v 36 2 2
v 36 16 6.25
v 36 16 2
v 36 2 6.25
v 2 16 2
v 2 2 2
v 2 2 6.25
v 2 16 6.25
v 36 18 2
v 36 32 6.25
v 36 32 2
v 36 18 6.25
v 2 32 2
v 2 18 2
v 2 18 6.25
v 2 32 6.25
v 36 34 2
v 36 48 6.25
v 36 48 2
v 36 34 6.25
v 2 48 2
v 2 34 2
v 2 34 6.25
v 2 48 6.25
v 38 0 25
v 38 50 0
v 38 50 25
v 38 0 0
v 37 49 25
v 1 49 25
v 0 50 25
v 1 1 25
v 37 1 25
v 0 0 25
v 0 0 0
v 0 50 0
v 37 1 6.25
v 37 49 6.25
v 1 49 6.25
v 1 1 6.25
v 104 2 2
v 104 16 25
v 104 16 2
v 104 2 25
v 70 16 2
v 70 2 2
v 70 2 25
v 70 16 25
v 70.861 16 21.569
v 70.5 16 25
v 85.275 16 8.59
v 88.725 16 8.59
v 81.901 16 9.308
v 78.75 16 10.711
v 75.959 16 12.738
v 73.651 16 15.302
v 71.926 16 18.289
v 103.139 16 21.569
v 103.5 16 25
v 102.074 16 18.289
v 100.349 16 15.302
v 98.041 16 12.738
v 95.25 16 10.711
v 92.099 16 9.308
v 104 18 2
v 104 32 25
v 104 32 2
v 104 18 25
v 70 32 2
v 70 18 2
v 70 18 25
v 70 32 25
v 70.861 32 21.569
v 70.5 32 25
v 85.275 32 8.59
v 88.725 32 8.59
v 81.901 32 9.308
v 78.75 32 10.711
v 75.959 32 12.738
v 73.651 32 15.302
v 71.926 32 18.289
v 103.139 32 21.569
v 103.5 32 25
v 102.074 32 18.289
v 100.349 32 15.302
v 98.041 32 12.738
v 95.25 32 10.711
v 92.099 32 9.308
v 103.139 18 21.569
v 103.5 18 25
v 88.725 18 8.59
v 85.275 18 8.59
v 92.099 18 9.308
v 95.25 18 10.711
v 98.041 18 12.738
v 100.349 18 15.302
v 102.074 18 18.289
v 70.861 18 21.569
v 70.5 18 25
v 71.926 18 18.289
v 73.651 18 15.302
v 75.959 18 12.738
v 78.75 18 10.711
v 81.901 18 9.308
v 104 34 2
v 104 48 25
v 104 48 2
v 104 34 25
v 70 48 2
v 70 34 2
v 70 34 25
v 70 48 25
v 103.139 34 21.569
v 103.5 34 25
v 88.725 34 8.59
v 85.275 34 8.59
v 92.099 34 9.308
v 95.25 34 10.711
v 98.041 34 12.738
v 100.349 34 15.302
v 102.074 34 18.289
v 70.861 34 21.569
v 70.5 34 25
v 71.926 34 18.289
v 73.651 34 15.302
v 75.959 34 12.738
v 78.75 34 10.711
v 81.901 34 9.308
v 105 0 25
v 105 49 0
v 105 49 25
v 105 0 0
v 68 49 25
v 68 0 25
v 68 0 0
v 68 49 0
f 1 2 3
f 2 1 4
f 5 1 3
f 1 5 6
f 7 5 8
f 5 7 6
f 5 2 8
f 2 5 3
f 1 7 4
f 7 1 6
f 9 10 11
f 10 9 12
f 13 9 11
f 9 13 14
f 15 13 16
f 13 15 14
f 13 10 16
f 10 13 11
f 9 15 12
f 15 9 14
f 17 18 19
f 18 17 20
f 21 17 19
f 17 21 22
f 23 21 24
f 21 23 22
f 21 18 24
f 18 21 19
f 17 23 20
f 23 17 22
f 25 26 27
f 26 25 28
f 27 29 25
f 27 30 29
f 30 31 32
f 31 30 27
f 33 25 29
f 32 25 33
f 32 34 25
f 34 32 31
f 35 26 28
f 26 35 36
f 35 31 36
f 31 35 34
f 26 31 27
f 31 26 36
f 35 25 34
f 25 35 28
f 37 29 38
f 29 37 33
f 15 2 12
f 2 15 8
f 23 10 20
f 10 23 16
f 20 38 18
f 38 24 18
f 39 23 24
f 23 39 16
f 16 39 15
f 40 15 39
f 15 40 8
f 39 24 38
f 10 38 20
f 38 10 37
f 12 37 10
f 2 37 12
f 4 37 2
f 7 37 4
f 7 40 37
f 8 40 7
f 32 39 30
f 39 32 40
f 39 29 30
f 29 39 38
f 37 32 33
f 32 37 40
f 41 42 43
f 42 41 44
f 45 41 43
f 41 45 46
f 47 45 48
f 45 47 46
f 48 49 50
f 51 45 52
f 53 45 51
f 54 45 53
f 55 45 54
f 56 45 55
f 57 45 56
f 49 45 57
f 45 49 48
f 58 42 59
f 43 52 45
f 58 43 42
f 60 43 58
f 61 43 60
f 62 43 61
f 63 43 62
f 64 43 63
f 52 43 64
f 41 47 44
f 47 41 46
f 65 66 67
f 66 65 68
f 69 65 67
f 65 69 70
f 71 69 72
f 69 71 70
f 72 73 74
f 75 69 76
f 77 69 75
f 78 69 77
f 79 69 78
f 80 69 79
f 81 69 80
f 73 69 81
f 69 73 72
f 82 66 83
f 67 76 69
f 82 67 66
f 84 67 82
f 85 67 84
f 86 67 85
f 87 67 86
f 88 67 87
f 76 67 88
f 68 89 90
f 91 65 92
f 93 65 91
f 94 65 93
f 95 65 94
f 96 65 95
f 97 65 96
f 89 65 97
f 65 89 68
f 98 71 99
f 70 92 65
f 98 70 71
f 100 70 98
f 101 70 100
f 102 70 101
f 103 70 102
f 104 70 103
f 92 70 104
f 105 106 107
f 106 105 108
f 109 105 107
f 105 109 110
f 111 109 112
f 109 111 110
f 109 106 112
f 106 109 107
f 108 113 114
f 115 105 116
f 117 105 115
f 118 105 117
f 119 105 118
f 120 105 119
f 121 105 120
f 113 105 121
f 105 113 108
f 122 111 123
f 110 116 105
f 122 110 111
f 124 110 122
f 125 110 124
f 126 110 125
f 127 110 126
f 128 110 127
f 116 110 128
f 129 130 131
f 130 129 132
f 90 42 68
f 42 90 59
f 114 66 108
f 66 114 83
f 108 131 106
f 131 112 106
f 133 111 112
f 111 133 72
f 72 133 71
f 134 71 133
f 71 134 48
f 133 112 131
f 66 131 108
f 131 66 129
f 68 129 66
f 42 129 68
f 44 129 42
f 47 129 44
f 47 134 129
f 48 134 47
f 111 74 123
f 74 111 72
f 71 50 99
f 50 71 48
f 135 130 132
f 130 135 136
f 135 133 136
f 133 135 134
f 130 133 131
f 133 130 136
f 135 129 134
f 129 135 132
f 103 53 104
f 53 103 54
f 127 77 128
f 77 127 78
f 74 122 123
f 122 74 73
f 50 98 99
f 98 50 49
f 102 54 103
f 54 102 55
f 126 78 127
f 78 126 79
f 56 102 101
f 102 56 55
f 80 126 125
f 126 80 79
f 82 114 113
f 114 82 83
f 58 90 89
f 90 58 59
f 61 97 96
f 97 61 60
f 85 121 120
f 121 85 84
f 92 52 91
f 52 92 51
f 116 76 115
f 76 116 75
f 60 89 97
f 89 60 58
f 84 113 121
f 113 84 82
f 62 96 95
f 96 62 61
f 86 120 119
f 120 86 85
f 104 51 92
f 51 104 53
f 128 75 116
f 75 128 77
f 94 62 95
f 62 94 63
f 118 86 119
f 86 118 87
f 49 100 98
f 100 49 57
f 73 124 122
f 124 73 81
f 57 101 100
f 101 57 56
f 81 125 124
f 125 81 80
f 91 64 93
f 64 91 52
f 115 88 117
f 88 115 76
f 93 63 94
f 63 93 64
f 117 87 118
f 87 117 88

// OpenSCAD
/* [Dimensions] */
// Base Length
LEN_BASE = 50;// [20:60]
// Base width
WIDTH = 38;//[20:120]
// Thickness of Base and Back
THICK = 2; //[1:4]
// height of Back
HEIGHT = 25; //[20:60]
// Number of Steps
BATTERY_NO = 3;//[1:8]

// -----------------------------
// Define Modules
// -----------------------------

module body(width, length, heigth, thickness){
difference() {
cube([width,length,heigth]);//Base


batterys(BATTERY_NO, THICK, 34,14,42);    
//translate([THICK,THICK,THICK])cube([34,14,42]);
//translate([THICK,THICK+16,THICK])cube([34,14,42]);
//translate([THICK,THICK+16+16,THICK])cube([34,14,42]);
    
    }

}

module batterys(number, thick, width, depth, height){
    for (i = [0 : number-1]){
        translate([thick,thick+(i*(thick+depth)),thick])cube([width,depth,height]);
        }
    }

// -----------------------------
// Put Components together
// -----------------------------
// Buttom Part
difference() {
body(WIDTH,LEN_BASE,HEIGHT,THICK);
//Middle Cut Out
translate([WIDTH/2,(25),HEIGHT])scale([01,1.2])rotate([90,0,0])cylinder(  20, d=LEN_BASE*0.66, center=true);
// Outer-Joint    
translate([01,01,HEIGHT/4])cube([WIDTH-THICK,LEN_BASE-THICK,HEIGHT-THICK]);
    }

// Top Part
translate([WIDTH+30,(0),0])difference() {
body(WIDTH-1,LEN_BASE-1,HEIGHT,THICK);

//Middle Cut Out
translate([WIDTH/2,(25),HEIGHT])scale([01,1.2])rotate([90,0,0])cylinder(  20, d=LEN_BASE*0.66, center=true);



    }
